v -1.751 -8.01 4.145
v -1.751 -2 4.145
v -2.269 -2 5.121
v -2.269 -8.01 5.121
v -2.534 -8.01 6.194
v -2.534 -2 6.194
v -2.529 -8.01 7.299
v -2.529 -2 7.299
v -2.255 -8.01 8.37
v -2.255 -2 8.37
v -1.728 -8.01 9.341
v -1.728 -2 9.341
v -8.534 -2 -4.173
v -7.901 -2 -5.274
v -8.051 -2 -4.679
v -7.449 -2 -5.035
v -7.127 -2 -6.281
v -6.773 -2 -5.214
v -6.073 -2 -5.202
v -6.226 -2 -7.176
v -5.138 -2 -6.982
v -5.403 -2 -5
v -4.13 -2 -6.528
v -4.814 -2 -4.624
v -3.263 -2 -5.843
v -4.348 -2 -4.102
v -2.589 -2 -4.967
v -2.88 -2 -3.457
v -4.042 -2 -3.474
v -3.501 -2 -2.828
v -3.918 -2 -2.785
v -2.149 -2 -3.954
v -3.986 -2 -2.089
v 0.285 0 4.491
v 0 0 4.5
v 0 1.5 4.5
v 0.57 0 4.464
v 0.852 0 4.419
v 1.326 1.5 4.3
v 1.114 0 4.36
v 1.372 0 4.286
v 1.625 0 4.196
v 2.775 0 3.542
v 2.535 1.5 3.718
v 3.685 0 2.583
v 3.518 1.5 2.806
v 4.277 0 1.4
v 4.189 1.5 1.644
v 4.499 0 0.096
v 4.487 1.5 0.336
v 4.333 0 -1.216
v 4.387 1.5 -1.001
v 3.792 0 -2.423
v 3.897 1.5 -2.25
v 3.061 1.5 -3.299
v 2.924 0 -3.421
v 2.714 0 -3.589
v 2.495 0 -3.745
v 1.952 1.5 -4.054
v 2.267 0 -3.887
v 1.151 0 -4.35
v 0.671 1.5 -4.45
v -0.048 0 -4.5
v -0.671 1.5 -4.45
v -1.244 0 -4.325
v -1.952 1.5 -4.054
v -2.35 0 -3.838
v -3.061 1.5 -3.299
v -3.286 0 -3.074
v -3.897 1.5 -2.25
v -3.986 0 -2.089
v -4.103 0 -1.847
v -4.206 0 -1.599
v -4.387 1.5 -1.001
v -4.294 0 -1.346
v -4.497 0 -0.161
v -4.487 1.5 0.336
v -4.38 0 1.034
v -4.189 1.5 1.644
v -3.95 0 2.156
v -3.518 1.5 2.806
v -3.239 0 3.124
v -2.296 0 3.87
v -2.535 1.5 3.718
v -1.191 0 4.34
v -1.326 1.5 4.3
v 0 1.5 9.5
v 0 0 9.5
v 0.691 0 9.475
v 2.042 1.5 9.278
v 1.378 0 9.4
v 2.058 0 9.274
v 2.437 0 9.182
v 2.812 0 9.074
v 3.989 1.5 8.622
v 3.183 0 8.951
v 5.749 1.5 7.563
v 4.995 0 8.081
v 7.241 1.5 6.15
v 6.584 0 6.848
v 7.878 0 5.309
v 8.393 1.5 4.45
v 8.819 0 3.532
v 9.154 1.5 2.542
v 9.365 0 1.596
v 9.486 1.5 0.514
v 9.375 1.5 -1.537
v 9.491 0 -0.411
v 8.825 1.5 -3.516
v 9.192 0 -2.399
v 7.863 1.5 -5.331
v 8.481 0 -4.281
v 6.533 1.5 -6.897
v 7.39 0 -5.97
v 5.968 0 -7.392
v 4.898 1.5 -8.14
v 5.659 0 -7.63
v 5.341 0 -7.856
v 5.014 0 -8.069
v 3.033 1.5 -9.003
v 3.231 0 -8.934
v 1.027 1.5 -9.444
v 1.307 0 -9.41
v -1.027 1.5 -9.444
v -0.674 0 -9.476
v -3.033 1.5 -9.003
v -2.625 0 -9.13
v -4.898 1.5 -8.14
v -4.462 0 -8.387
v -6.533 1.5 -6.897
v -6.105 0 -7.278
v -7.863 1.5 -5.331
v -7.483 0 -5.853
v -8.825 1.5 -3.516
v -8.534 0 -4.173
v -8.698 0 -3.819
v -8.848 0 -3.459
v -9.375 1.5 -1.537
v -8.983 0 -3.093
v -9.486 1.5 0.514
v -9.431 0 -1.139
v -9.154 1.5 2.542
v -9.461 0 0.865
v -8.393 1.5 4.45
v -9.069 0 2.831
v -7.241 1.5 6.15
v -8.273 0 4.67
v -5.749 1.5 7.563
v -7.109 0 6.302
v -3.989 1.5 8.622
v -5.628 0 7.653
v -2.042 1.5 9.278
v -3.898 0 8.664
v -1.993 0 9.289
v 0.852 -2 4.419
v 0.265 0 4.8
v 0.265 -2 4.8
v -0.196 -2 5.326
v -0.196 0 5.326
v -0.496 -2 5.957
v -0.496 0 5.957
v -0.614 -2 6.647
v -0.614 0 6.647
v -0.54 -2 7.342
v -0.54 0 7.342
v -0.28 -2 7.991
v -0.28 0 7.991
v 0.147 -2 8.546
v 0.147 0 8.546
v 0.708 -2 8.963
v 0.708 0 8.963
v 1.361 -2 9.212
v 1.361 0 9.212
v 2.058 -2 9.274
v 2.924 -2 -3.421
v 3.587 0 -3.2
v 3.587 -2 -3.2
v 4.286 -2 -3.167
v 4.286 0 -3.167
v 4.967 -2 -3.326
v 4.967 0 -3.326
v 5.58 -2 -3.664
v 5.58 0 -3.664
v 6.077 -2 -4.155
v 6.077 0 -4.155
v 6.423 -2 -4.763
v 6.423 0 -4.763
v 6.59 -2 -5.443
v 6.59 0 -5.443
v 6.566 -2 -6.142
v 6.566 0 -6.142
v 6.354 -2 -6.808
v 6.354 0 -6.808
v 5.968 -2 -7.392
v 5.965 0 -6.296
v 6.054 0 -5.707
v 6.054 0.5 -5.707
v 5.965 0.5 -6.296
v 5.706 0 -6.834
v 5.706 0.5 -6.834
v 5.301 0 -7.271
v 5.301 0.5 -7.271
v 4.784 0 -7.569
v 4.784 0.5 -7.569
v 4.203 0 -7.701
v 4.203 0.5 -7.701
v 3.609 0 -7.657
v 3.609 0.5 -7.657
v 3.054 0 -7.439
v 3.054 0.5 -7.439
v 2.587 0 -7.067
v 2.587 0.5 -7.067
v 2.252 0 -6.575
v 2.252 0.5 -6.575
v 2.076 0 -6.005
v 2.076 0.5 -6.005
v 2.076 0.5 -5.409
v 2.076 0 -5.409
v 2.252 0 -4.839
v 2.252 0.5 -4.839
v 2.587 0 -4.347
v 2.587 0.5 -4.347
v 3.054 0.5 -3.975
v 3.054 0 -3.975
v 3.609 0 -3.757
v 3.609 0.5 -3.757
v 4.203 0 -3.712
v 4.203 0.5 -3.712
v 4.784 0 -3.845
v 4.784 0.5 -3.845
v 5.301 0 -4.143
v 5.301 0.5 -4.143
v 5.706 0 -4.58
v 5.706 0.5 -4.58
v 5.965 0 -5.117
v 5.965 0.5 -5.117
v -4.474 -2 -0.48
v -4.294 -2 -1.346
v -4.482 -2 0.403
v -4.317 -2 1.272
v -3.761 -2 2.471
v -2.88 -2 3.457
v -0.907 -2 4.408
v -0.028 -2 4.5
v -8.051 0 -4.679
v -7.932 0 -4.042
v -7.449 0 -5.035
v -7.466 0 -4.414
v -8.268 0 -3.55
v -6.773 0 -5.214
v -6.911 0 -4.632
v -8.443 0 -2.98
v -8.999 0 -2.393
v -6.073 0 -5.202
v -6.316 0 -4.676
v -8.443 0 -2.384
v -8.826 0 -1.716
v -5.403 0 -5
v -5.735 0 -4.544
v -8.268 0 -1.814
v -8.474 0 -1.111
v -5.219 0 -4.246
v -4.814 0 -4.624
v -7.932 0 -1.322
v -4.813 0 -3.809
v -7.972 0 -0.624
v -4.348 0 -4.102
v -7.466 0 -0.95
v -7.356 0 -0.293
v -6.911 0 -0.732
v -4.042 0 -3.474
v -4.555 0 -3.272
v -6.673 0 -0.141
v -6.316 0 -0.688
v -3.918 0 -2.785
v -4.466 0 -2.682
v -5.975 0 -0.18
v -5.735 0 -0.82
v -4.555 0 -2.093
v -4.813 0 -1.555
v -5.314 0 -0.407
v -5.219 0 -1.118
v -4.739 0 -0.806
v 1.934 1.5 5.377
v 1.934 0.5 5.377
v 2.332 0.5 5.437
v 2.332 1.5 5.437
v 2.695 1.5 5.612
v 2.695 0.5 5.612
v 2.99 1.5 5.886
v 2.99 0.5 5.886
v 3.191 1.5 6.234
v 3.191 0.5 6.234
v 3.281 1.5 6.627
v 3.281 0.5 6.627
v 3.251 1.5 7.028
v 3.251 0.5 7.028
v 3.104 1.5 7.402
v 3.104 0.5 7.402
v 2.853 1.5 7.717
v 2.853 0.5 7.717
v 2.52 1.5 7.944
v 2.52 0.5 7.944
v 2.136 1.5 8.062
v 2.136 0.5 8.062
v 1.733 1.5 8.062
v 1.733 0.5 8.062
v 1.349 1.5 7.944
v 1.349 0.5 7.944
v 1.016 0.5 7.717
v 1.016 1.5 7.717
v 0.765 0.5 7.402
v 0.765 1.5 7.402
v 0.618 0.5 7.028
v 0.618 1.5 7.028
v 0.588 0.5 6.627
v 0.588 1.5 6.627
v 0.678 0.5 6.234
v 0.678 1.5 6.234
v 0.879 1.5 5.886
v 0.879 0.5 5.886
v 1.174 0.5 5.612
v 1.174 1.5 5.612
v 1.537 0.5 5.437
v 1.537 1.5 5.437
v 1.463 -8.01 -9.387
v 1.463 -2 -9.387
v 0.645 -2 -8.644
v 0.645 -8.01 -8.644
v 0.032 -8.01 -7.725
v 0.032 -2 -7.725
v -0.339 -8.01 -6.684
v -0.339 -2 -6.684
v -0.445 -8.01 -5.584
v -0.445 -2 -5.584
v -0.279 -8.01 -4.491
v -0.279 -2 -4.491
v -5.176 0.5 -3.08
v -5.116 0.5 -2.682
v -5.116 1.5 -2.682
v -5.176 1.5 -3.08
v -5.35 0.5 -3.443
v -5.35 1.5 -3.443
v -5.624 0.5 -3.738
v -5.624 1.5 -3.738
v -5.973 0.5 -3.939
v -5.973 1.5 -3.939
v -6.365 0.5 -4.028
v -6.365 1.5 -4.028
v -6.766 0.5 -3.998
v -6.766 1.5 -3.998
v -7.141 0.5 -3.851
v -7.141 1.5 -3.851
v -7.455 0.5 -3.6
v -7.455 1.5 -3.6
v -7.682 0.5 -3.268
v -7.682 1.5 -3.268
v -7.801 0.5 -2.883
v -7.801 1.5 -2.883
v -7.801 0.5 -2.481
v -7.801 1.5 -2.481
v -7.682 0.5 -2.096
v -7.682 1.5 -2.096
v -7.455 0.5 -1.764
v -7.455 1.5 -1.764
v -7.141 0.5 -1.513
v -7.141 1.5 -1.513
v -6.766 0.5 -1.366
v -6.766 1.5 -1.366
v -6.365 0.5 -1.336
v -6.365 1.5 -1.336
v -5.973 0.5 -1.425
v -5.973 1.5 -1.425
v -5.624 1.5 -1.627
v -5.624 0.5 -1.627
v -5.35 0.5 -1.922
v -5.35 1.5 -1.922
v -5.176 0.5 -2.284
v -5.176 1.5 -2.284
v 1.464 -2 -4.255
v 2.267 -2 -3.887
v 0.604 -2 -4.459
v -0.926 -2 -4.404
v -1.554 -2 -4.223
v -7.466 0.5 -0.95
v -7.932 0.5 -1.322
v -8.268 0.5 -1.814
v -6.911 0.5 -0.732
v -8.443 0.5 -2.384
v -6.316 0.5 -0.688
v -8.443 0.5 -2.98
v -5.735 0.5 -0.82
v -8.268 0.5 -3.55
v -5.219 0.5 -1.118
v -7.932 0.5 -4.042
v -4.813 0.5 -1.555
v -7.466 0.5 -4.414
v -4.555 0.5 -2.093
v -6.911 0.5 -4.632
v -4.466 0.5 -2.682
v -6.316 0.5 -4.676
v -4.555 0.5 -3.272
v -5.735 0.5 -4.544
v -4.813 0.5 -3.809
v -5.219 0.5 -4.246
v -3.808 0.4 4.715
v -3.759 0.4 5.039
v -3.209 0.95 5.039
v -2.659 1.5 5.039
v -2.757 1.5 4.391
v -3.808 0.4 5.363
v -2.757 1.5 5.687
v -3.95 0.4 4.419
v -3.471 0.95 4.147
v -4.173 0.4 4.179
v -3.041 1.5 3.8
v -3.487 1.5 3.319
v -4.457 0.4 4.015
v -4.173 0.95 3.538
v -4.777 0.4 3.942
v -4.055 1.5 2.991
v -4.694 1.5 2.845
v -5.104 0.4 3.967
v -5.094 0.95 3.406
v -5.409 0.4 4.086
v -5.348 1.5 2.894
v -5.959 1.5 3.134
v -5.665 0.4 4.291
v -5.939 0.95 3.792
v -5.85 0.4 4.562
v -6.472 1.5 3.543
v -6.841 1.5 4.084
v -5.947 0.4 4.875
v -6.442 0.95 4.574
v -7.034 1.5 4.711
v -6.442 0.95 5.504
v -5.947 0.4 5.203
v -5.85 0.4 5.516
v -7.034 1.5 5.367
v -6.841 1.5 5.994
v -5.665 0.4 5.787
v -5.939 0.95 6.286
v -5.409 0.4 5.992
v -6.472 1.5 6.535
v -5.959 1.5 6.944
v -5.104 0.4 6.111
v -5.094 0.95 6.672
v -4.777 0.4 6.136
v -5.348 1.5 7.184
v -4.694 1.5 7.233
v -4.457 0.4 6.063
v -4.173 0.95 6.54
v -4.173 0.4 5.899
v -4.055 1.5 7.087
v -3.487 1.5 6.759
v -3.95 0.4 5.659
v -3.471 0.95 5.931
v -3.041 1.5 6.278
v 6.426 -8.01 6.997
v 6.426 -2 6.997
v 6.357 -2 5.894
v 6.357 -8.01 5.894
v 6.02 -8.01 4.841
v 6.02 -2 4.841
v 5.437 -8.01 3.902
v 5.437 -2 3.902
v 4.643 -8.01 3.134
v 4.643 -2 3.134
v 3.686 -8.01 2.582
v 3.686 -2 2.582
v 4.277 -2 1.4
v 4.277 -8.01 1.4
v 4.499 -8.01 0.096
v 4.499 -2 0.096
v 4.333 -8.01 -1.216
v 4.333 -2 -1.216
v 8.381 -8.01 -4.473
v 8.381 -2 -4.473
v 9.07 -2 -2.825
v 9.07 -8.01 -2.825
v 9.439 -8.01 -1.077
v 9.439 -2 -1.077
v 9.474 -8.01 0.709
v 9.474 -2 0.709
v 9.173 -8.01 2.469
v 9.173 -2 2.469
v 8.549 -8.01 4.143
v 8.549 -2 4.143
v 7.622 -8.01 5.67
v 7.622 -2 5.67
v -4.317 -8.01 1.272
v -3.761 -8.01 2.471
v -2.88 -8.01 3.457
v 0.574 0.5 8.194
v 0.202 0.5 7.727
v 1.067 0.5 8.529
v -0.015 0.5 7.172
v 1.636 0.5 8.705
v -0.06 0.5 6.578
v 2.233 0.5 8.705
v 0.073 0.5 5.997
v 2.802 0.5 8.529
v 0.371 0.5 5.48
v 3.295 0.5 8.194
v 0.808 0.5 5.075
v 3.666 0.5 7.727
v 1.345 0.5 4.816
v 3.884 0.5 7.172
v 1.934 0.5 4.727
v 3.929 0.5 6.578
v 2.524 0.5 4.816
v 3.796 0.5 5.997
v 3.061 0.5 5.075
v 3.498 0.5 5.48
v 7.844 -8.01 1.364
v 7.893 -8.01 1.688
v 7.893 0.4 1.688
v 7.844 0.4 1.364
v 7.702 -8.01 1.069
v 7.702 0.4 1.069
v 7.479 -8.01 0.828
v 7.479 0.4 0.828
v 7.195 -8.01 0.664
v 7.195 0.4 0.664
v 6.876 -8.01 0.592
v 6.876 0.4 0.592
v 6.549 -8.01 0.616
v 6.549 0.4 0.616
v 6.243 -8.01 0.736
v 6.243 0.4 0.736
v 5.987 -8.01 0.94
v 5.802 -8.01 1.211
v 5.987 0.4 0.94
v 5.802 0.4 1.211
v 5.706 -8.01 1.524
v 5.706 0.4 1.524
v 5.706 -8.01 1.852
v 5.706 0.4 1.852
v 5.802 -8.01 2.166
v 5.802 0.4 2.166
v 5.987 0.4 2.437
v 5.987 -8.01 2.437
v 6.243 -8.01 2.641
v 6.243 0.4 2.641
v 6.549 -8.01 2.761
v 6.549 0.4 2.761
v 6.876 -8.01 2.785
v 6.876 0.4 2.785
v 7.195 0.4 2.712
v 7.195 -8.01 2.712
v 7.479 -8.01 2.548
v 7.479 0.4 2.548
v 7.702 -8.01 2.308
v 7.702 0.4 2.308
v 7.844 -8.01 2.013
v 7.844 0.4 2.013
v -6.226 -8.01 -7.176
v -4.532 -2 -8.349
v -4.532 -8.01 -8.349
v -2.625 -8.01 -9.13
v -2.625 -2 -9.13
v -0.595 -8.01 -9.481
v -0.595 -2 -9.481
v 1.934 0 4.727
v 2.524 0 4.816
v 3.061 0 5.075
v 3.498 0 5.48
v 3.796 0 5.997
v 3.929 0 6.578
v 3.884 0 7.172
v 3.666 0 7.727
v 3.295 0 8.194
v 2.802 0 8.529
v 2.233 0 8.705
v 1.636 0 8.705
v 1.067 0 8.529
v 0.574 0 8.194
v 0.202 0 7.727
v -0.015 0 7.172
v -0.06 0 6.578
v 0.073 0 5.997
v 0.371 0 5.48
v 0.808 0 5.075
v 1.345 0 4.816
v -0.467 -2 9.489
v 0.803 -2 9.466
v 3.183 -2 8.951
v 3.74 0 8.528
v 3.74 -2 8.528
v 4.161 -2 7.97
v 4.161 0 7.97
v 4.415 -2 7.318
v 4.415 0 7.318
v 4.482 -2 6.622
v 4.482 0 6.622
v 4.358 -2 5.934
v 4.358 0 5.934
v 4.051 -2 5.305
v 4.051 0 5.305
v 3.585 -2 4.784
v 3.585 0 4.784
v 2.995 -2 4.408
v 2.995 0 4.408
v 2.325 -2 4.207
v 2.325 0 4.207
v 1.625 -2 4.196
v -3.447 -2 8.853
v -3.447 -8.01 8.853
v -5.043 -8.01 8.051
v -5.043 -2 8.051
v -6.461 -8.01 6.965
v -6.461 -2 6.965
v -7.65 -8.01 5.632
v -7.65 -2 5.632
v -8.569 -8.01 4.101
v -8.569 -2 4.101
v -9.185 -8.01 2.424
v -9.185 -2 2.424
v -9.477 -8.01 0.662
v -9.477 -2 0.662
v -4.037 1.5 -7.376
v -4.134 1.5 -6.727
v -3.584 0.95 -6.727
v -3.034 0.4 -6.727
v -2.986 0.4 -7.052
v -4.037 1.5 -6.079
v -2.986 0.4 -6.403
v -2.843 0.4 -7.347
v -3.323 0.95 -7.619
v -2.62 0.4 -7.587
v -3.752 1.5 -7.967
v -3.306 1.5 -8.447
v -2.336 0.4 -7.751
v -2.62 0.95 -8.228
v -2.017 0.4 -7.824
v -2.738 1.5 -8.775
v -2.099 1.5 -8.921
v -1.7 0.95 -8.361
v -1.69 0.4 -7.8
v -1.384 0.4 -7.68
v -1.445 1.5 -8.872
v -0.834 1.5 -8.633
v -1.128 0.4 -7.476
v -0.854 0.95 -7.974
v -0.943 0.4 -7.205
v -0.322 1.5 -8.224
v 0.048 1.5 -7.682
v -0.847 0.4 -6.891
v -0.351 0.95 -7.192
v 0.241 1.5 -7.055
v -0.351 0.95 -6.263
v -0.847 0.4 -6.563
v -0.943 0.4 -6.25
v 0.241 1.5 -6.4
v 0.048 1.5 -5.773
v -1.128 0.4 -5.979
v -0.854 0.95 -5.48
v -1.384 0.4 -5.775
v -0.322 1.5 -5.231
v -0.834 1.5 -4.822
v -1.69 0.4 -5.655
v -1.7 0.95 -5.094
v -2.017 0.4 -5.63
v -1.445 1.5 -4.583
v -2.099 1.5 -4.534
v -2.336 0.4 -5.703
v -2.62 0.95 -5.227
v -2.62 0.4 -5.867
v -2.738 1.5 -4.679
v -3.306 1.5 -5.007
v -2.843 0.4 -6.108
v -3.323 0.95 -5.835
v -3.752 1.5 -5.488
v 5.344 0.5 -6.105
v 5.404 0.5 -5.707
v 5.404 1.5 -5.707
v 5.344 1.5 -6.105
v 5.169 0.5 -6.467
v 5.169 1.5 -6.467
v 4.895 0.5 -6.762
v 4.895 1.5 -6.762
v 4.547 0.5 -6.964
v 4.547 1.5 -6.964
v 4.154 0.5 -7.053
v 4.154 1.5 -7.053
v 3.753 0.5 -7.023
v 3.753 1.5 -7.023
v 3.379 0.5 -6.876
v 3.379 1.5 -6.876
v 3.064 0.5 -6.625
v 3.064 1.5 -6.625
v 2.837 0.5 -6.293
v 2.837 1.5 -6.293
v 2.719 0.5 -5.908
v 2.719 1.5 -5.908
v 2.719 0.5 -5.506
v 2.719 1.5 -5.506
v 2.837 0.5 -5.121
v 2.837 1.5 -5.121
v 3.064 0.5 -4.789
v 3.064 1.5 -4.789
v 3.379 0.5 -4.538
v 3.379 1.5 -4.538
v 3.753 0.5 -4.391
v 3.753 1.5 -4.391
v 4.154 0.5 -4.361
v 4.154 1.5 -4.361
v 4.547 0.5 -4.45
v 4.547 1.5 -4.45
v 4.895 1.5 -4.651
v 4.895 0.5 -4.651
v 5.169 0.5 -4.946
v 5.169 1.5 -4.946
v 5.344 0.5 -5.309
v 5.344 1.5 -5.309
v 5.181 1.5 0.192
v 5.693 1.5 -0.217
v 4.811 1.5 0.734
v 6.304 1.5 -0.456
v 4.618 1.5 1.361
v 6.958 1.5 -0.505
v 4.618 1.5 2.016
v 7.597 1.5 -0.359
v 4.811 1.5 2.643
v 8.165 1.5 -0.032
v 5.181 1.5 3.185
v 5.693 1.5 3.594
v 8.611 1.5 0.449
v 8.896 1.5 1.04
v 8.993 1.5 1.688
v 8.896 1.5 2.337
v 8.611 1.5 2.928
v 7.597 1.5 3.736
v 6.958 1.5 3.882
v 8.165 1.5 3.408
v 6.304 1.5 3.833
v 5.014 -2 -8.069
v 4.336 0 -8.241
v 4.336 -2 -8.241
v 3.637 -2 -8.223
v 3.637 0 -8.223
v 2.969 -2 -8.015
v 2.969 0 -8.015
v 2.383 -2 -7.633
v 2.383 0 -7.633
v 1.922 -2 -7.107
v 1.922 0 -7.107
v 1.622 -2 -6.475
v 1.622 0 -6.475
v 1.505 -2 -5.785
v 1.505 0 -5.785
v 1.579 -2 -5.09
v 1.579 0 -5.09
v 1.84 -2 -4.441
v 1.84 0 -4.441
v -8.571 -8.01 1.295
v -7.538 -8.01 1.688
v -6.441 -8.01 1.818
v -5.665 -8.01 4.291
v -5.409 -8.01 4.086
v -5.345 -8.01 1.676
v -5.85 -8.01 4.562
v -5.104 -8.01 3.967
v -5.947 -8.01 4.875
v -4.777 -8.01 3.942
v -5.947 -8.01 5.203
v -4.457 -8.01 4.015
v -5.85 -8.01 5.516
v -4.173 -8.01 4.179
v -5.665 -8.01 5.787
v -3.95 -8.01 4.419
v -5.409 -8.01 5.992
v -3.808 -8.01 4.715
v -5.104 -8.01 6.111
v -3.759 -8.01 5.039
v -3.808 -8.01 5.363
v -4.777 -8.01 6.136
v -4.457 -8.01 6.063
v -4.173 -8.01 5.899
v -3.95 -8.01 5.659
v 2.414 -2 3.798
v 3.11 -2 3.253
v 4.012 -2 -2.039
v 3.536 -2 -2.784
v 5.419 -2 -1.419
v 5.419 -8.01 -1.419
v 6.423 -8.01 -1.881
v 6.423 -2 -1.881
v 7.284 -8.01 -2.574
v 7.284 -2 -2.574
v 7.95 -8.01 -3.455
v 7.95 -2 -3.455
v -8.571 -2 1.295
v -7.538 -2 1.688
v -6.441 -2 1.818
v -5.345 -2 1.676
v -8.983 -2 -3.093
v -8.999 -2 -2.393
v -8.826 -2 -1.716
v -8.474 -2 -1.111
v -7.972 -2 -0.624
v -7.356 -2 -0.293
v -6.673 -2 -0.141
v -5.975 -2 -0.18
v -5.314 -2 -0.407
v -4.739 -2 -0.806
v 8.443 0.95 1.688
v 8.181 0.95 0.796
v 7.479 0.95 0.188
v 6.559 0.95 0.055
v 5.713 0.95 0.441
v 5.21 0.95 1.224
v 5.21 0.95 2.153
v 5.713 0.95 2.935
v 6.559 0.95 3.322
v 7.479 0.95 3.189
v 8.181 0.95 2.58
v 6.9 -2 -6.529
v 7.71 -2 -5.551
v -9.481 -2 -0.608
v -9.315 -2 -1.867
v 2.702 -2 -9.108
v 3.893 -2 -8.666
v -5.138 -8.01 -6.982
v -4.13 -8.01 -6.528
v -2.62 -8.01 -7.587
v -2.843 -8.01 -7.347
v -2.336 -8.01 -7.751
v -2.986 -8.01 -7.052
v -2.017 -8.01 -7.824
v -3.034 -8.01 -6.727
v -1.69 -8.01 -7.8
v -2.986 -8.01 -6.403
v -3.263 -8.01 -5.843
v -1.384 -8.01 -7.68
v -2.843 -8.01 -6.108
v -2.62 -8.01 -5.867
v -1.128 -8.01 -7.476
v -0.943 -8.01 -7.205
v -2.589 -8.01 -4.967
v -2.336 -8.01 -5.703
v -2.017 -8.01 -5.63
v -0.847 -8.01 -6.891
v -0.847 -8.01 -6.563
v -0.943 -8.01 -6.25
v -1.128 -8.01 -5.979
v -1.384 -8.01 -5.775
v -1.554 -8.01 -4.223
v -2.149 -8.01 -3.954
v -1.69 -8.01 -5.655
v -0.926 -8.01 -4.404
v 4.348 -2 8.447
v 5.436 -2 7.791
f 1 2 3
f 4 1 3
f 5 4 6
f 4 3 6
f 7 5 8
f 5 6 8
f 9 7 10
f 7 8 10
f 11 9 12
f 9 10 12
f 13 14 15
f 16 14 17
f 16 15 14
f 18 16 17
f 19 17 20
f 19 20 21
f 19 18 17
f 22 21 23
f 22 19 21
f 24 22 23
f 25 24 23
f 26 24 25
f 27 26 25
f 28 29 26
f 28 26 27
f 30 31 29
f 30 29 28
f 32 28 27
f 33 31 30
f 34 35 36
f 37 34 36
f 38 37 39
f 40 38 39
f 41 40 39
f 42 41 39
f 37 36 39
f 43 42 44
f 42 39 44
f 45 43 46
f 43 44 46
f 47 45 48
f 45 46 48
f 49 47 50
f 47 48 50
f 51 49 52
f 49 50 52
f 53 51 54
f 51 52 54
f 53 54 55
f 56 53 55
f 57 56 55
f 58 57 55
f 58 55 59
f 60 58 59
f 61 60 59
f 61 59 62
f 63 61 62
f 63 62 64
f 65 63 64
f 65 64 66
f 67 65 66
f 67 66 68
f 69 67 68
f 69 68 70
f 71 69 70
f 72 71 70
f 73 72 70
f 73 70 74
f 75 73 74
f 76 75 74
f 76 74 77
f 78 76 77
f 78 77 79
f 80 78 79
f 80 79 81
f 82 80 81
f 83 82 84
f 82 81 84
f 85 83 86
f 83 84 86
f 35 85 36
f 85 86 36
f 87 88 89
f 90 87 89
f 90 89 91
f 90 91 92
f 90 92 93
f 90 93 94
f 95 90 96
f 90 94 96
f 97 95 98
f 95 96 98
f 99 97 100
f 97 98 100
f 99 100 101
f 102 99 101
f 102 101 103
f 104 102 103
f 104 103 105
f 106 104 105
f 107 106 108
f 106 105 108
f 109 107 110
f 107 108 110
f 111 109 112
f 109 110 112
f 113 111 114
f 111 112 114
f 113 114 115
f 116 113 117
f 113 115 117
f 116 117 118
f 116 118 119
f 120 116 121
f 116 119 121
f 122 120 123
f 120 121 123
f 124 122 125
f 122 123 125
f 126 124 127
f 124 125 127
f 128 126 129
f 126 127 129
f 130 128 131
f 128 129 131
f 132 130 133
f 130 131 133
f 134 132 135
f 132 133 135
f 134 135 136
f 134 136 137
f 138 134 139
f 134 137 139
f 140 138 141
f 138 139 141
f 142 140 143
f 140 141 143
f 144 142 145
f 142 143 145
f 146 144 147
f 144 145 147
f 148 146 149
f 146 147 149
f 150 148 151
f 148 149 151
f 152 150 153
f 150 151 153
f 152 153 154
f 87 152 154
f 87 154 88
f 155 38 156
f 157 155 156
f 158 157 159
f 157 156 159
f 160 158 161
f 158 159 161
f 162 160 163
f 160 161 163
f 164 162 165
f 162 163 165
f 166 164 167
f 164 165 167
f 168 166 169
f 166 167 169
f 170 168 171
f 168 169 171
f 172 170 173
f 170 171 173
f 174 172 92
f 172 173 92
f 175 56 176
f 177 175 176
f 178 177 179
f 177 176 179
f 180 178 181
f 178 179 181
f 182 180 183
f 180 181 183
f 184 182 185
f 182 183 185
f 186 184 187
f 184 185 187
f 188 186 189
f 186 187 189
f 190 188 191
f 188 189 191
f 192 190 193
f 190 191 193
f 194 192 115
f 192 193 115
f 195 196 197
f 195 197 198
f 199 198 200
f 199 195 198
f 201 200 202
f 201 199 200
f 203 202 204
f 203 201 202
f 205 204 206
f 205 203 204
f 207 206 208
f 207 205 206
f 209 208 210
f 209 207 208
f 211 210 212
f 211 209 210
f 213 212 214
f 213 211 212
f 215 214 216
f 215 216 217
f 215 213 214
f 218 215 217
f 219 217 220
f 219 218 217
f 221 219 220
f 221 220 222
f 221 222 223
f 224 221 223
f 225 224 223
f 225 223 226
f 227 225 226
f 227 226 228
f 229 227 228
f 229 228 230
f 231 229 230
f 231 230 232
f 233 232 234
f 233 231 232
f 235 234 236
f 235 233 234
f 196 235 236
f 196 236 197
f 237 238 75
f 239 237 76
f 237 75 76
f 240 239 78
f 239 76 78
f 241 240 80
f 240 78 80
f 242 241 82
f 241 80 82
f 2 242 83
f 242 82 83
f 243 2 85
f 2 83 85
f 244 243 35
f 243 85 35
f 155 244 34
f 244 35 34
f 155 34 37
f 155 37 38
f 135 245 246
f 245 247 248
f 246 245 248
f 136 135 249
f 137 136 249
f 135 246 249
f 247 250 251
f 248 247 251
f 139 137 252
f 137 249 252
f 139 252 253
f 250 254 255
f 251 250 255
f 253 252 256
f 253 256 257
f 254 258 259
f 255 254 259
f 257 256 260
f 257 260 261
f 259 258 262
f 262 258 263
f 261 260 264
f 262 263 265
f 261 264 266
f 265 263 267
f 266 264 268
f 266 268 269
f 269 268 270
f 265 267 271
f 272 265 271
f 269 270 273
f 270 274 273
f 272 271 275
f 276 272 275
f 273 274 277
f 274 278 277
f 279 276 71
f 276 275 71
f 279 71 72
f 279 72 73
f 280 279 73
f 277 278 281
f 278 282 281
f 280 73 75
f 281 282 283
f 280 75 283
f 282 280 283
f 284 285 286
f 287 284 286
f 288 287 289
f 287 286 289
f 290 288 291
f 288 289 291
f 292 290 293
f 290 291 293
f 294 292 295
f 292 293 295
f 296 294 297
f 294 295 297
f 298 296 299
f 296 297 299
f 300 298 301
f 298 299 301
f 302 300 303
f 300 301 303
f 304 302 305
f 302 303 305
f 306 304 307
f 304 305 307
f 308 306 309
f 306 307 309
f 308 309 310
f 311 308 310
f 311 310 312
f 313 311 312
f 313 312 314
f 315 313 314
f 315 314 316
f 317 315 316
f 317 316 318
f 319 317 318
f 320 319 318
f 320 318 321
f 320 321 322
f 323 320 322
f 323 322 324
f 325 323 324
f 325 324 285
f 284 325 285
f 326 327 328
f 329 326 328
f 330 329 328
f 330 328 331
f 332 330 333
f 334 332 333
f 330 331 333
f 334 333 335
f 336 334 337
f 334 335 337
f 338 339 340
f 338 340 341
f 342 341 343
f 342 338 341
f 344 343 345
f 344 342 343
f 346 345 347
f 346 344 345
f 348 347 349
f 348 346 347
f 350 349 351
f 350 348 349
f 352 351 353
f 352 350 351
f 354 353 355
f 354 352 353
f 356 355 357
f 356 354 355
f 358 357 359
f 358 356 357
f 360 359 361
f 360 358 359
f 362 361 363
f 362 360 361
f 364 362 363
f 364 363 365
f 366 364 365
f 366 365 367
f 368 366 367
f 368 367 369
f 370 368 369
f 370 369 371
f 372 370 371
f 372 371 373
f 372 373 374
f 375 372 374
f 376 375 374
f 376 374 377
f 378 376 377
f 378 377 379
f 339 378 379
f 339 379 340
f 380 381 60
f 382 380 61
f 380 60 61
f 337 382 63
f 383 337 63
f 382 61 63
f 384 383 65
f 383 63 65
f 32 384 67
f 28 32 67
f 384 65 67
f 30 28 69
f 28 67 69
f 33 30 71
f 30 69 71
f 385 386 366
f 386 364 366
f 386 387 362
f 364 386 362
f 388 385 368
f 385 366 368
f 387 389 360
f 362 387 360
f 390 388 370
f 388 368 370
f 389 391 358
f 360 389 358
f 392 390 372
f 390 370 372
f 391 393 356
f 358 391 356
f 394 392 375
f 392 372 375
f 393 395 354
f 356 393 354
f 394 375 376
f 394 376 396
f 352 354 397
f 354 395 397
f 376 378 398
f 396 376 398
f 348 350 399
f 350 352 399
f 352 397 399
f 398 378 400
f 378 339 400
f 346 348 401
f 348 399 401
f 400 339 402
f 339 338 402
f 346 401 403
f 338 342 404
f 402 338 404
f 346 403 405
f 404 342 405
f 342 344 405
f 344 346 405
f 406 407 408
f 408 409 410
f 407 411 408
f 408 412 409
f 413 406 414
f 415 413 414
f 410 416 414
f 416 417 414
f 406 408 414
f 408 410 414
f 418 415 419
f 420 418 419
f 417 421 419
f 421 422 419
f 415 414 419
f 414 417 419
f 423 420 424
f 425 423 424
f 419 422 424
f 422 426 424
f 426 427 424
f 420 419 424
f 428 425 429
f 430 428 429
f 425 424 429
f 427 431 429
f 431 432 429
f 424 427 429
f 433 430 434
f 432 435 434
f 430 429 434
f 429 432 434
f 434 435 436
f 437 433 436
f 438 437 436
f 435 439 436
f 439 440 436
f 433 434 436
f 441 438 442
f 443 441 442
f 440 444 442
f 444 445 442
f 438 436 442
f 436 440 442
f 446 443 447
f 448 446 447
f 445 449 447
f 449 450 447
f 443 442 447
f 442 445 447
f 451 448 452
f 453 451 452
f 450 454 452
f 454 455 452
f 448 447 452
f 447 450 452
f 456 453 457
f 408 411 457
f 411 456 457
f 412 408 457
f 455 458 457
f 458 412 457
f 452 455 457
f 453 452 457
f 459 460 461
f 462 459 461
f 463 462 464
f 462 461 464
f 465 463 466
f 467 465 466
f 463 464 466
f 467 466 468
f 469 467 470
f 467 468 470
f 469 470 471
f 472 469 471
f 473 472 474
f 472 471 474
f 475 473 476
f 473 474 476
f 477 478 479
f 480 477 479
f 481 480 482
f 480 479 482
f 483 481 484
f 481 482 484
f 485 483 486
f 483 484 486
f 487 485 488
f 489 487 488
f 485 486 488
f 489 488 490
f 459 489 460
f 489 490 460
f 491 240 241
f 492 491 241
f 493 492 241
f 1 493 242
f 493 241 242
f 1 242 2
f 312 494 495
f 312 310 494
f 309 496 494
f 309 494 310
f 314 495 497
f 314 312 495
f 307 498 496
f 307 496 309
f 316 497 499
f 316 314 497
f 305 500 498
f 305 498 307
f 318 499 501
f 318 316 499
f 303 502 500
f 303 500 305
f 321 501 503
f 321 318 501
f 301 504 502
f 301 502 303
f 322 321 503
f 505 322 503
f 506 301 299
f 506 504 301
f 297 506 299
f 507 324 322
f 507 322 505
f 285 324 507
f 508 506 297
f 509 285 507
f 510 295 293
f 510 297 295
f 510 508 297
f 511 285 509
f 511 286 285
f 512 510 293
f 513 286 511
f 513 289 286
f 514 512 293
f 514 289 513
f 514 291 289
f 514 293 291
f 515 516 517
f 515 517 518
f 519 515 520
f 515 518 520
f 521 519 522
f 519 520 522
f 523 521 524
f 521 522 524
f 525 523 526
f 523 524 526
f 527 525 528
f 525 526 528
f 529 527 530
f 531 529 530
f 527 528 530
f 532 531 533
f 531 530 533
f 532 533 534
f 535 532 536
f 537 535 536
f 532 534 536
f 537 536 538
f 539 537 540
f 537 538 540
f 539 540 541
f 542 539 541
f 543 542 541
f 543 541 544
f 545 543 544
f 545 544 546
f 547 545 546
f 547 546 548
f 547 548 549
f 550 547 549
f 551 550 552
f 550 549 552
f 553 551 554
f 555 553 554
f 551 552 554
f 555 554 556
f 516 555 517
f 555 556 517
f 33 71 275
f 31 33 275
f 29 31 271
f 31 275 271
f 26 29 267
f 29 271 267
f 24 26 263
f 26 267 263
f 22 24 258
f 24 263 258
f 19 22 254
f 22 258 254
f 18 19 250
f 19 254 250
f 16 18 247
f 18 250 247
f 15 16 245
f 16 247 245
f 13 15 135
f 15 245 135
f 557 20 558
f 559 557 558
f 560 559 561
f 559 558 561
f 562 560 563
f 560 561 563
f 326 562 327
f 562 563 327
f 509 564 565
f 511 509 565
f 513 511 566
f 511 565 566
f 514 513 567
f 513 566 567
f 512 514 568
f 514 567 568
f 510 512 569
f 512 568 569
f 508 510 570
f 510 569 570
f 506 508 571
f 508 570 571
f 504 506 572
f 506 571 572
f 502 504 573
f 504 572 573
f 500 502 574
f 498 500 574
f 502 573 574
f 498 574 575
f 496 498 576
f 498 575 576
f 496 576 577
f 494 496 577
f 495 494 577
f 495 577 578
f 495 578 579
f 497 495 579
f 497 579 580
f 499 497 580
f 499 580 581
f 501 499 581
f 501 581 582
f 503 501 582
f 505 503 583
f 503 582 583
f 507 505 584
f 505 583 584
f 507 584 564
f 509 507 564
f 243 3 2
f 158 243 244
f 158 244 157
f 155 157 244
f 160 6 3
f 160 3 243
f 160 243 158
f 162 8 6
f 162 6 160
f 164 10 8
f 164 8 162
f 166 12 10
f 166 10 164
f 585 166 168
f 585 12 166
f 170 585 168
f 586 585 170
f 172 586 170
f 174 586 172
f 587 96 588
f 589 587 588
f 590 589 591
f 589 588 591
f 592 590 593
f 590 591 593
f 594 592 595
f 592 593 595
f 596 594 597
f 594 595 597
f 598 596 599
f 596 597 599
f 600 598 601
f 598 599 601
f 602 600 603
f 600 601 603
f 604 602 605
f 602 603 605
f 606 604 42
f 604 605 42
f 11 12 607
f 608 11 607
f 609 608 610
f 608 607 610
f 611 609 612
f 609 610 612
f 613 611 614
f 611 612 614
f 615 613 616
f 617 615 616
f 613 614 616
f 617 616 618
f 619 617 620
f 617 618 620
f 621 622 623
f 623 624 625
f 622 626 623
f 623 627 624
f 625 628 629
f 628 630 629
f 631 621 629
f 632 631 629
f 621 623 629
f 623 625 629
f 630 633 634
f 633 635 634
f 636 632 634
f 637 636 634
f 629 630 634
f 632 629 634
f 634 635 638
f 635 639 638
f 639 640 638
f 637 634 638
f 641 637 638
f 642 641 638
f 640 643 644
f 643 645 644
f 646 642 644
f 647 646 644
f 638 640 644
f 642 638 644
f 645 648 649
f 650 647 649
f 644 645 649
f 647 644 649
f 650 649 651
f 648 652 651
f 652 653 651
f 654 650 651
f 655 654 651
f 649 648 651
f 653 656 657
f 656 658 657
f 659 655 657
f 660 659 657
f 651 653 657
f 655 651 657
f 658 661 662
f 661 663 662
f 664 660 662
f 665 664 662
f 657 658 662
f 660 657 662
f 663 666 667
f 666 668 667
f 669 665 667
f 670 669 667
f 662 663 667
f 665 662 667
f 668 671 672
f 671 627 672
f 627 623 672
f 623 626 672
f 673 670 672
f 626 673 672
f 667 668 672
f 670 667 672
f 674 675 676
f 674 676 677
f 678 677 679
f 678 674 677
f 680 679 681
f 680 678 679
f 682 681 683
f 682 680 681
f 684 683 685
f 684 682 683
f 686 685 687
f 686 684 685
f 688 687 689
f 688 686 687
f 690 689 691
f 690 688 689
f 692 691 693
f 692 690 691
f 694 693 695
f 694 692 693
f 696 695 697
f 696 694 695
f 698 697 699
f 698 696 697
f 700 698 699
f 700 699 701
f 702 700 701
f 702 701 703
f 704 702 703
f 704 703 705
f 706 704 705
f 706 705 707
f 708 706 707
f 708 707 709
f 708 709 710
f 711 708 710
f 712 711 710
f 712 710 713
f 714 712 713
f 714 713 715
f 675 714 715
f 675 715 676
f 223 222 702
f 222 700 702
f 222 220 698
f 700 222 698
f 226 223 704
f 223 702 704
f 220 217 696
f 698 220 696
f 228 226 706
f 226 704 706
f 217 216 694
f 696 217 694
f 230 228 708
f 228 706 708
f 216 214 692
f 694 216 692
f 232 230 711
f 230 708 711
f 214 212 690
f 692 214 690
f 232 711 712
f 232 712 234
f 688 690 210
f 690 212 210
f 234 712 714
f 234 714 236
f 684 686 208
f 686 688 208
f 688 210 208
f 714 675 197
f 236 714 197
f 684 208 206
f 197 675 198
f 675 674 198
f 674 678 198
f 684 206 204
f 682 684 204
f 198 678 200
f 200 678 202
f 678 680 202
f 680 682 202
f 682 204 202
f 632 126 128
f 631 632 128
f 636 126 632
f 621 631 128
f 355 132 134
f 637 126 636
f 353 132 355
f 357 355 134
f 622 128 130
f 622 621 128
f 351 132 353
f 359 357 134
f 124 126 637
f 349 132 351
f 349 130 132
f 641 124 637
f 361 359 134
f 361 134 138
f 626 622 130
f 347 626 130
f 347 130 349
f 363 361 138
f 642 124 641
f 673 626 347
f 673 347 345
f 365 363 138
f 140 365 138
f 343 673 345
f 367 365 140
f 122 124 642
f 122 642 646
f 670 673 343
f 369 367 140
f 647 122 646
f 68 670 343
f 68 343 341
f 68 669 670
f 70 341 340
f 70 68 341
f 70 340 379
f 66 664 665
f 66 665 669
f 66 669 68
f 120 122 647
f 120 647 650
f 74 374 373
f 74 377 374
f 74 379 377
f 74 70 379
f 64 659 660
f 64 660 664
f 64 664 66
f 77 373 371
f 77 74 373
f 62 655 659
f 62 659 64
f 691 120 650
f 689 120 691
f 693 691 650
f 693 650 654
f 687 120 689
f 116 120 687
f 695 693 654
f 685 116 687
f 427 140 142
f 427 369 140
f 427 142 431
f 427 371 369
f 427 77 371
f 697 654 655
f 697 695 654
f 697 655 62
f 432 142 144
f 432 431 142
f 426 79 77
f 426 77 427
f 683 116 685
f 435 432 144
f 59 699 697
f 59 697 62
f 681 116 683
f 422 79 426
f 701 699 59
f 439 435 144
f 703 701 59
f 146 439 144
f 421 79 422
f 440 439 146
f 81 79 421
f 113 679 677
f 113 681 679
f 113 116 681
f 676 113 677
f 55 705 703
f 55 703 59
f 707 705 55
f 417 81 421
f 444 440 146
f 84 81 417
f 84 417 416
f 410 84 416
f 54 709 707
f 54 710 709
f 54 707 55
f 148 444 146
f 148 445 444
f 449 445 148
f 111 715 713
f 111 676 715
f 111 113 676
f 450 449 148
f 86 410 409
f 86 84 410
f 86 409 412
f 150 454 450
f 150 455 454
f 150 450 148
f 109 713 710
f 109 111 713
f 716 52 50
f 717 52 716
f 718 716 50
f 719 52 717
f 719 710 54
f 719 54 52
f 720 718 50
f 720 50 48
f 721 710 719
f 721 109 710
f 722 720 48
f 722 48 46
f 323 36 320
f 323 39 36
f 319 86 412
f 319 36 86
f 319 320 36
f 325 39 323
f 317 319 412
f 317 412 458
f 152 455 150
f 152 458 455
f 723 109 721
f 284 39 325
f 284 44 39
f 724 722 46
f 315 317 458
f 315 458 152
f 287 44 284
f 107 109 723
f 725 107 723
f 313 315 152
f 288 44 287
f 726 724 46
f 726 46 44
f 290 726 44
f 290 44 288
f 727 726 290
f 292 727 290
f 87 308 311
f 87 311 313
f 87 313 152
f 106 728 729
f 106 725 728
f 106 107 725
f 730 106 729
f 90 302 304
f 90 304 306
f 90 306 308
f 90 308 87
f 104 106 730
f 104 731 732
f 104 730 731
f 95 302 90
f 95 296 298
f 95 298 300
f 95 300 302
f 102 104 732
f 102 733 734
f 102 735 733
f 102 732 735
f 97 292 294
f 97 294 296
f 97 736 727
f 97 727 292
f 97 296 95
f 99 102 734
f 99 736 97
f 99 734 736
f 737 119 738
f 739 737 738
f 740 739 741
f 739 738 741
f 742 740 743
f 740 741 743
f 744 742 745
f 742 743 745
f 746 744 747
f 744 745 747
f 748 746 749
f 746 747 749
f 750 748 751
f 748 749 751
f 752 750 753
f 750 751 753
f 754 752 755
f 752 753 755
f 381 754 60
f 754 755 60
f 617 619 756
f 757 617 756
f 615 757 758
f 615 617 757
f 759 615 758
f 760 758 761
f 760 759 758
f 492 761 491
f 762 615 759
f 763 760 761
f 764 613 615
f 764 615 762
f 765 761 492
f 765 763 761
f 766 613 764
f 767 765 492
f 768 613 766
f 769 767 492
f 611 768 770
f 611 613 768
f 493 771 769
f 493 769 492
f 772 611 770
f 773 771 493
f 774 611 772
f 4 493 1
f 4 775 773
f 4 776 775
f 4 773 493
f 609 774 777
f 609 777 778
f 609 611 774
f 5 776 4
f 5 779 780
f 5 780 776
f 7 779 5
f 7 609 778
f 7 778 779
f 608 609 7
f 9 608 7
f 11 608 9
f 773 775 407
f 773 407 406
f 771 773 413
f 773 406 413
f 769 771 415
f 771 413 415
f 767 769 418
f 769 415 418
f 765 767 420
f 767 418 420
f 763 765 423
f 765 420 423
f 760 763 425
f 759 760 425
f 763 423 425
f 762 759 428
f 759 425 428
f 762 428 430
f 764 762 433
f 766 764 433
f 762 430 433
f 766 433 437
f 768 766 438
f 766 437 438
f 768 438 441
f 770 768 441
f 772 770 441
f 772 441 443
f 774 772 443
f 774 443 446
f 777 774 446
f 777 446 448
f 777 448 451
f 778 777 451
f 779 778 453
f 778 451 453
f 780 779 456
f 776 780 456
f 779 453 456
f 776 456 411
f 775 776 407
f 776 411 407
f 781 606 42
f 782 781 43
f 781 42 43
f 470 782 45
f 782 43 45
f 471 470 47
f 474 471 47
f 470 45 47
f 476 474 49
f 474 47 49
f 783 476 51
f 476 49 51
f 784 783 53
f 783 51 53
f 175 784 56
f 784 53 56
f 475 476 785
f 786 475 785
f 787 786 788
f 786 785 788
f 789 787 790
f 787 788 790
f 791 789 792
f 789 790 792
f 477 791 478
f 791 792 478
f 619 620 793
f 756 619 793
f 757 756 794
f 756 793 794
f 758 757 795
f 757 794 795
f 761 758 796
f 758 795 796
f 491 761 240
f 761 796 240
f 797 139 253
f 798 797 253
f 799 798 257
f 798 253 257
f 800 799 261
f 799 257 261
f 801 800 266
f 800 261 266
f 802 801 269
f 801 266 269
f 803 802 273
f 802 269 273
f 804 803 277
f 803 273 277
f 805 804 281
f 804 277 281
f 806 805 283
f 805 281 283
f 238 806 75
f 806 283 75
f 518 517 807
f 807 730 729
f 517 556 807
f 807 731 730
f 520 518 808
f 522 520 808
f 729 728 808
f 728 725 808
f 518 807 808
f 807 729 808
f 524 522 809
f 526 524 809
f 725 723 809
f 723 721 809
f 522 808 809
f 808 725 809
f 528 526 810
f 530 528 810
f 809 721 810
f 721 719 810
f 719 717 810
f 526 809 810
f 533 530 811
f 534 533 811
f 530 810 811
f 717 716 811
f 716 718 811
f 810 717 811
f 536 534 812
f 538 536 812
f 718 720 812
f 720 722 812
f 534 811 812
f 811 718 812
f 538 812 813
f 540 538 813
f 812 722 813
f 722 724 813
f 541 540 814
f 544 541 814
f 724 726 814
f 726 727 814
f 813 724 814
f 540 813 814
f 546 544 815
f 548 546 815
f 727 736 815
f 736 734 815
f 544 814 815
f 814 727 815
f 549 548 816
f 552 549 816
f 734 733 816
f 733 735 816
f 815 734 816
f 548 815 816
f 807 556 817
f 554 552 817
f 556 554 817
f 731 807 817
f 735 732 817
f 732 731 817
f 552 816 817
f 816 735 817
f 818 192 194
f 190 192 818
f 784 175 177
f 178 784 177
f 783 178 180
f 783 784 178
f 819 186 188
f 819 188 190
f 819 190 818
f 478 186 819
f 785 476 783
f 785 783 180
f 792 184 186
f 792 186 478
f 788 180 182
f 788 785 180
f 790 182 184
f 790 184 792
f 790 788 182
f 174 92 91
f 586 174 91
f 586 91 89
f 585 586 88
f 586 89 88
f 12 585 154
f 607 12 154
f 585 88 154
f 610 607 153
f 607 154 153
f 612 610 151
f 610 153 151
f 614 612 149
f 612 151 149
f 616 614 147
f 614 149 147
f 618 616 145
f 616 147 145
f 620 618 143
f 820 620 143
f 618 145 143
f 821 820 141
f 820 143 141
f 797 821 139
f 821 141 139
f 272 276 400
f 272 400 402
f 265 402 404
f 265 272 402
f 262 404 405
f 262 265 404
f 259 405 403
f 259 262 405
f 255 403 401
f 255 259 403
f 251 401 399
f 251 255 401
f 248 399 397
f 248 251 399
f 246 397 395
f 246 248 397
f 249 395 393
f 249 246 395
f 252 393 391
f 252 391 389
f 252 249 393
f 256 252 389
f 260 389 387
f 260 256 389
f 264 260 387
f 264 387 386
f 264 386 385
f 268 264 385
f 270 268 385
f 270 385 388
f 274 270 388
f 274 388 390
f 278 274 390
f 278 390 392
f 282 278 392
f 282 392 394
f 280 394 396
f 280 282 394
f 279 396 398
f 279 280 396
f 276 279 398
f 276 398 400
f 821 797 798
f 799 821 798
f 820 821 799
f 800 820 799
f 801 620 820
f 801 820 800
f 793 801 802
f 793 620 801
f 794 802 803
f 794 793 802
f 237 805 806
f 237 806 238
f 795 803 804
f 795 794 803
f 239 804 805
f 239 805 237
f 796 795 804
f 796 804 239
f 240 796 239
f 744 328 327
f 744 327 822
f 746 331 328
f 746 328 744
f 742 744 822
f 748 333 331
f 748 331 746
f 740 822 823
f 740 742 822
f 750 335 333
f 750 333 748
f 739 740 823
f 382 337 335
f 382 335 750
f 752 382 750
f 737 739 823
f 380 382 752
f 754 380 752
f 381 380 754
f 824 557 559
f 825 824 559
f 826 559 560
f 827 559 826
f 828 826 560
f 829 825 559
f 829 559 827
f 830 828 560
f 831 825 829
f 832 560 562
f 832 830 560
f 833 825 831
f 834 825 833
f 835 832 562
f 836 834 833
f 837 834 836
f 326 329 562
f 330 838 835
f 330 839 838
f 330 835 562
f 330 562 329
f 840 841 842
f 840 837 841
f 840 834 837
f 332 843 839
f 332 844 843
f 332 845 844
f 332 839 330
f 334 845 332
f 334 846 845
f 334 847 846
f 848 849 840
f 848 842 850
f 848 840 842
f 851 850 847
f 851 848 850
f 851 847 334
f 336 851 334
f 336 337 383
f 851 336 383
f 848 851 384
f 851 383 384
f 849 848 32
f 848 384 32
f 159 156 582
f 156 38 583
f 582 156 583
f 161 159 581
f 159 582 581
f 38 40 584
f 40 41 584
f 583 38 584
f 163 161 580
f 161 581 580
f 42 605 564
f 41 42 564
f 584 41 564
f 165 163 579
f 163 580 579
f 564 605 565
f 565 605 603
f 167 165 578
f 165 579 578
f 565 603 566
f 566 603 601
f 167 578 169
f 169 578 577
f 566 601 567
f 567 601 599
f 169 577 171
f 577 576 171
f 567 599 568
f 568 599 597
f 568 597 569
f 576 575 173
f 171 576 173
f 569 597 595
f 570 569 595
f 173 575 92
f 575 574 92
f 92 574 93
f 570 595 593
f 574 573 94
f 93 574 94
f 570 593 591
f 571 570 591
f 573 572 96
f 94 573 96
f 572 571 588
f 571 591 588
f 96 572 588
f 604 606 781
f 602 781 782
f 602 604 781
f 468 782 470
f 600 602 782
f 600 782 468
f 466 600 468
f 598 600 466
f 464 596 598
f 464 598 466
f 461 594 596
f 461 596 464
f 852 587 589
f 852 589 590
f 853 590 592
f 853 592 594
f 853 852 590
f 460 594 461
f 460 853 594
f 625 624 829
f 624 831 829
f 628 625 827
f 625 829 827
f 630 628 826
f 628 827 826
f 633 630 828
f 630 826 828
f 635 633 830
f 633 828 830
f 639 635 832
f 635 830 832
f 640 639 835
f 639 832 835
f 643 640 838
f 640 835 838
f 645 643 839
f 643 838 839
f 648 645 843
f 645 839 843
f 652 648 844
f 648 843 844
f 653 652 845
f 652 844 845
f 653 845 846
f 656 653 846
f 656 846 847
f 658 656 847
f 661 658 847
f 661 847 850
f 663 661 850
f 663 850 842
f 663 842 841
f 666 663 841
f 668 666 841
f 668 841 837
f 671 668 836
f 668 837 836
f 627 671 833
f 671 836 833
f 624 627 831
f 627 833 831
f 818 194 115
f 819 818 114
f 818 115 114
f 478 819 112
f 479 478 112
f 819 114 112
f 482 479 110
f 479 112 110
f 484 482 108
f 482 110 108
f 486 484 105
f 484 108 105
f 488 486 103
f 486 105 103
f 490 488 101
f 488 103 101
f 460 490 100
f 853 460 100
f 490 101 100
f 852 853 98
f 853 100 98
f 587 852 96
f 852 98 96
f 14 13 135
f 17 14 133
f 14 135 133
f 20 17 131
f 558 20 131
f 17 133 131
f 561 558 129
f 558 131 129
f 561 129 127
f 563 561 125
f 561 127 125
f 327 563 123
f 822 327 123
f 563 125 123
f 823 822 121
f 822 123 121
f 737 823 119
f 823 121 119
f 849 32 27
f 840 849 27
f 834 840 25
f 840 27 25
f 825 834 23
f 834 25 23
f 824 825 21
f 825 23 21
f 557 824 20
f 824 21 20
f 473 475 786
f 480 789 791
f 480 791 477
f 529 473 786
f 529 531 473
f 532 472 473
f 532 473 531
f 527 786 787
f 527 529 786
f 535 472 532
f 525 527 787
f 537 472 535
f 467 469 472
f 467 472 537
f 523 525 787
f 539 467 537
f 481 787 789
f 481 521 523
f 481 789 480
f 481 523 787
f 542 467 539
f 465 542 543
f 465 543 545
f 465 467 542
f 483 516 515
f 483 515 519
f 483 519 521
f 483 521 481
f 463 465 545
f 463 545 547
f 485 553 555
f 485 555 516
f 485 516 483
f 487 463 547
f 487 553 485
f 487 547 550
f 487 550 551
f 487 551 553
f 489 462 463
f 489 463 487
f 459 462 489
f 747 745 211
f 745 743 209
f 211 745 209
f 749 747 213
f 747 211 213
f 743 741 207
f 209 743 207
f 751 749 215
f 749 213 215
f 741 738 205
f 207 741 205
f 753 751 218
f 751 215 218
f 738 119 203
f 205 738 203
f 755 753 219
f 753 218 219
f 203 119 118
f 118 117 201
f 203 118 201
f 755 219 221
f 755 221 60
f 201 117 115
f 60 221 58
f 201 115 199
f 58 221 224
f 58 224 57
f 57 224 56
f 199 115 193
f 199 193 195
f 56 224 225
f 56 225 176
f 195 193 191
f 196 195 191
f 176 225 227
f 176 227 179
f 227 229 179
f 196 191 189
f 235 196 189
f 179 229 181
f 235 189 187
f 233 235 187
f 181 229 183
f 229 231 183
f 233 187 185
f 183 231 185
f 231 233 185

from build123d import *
from build123d.topology import SkipClean

# Parameters (mm, degrees)
SKETCH1_R                                       = 9.5
BOSS_EXTRUDE1_DEPTH                             = 1.5
SKETCH2_R                                       = 4.5
CUT_EXTRUDE1_DEPTH                              = 14.518505835
SKETCH3_R                                       = 2
CUT_EXTRUDE5_DEPTH                              = 0.5
SKETCH4_R                                       = 1.35
CUT_EXTRUDE6_DEPTH                              = 14.518505835
BOSS_EXTRUDE2_DEPTH                             = 2
CIRPATTERN1_OUTLINE_R                           = 1.35
CIRPATTERN1_DEPTH                               = 1.5
CIRPATTERN1_2_OUTLINE_R                         = 2
CIRPATTERN1_2_OUTLINE_R_2                       = 1.35
CIRPATTERN1_2_DEPTH                             = 0.5
BOSS_EXTRUDE3_DEPTH                             = 6.01
CSK_FOR_M2_FLAT_HEAD_MACHINE_SCREW1_D           = 2.2
CSK_FOR_M2_FLAT_HEAD_MACHINE_SCREW1_CSINK_D     = 4.4
CSK_FOR_M2_FLAT_HEAD_MACHINE_SCREW1_CSINK_ANGLE = 90


# Read off the part's stored shape, not the designer's step: CirPattern1, CirPattern2
with BuildPart() as part:
    # Sketch1 → Boss-Extrude1 (new body)
    with BuildSketch(Plane(origin=(0, 0, 0), x_dir=(1, 0, 0), z_dir=(0, 1, 0))):
        with Locations(Location((0, 0, 0), (0, 0, 270))):
            Circle(SKETCH1_R)
    extrude(amount=BOSS_EXTRUDE1_DEPTH)

    # Sketch2 → Cut-Extrude1 (cut, through all)
    with BuildSketch(Plane(origin=(0, 1.5, 0), x_dir=(1, 0, 0), z_dir=(0, 1, 0))):
        with Locations(Location((0, 0, 0), (0, 0, 270))):
            Circle(SKETCH2_R)
    extrude(amount=-CUT_EXTRUDE1_DEPTH, mode=Mode.SUBTRACT)

    # Sketch3 → Cut-Extrude5 (cut)
    with BuildSketch(Plane.XZ):
        with Locations(Location((1.93443789, 6.72740292, 0), (0, 0, 270))):
            Circle(SKETCH3_R)
    extrude(amount=-CUT_EXTRUDE5_DEPTH, mode=Mode.SUBTRACT)

    # Sketch4 → Cut-Extrude6 (cut, through all)
    with BuildSketch(Plane.XZ):
        with Locations(Location((1.93443789, 6.72740292, 0), (0, 0, 270))):
            Circle(SKETCH4_R)
    extrude(amount=-CUT_EXTRUDE6_DEPTH, mode=Mode.SUBTRACT)

    # Sketch5 → Boss-Extrude2 (add)
    with SkipClean():  # the faces are left unmerged after this step: merging them gives an invalid solid
        with BuildSketch(Plane.XZ):
            with BuildLine():
                ThreePointArc((3.182648464, 8.951019425), (4.357780459, 5.933733723), (1.625396676, 4.196198952))
                ThreePointArc((1.625396676, 4.196198952), (4.436036831, 0.756027269), (2.92357195, -3.420924883))
                ThreePointArc((2.92357195, -3.420924883), (6.077241126, -4.155308257), (5.967881507, -7.391507987))
                ThreePointArc((5.967881507, -7.391507987), (9.364966644, 1.596057567), (3.182648464, 8.951019425))
            make_face()
            with BuildLine():
                ThreePointArc((0.851769477, 4.418652369), (-0.540347051, 7.342170761), (2.058000389, 9.274407496))
                ThreePointArc((2.058000389, 9.274407496), (-7.086809251, 6.326700138), (-8.982537647, -3.092574561))
                ThreePointArc((-8.982537647, -3.092574561), (-7.356211508, -0.292572507), (-4.294138699, -1.34550096))
                ThreePointArc((-4.294138699, -1.34550096), (-3.356909645, 2.99685796), (0.851769477, 4.418652369))
            make_face()
            with BuildLine():
                ThreePointArc((-8.534166016, -4.173488997), (-2.625308565, -9.13004682), (5.013839927, -8.069164095))
                ThreePointArc((5.013839927, -8.069164095), (1.922148158, -7.106672419), (2.267302196, -3.887073546))
                ThreePointArc((2.267302196, -3.887073546), (-1.243567215, -4.32475902), (-3.985711115, -2.089044497))
                ThreePointArc((-3.985711115, -2.089044497), (-5.403439375, -5.000228929), (-8.534166016, -4.173488997))
            make_face()
        extrude(amount=BOSS_EXTRUDE2_DEPTH)

    # CirPattern1 outline → CirPattern1 (cut)
    with SkipClean():  # the faces are left unmerged after this step: merging them gives an invalid solid
        with BuildSketch(Plane(origin=(0, 0, 0), x_dir=(1, 0, 0), z_dir=(0, 1, 0))):
            with Locations((4.053593102, 5.706871557)):
                Circle(CIRPATTERN1_OUTLINE_R)
            with Locations((-6.465797695, 2.68206267)):
                Circle(CIRPATTERN1_OUTLINE_R)
        extrude(amount=CIRPATTERN1_DEPTH, mode=Mode.SUBTRACT)

    # CirPattern1 2 outline → CirPattern1 2 (cut)
    # profile 1 of 2: a face of its own
    with SkipClean():  # the faces are left unmerged after this step: merging them gives an invalid solid
        with BuildSketch(Plane(origin=(0, 0, 0), x_dir=(1, 0, 0), z_dir=(0, 1, 0))):
            with Locations((-6.465797695, 2.68206267)):
                Circle(CIRPATTERN1_2_OUTLINE_R)
            with Locations((-6.465797695, 2.68206267)):
                Circle(CIRPATTERN1_2_OUTLINE_R_2, mode=Mode.SUBTRACT)
        # profile 2 of 2: a face of its own
        with BuildSketch(Plane(origin=(0, 0, 0), x_dir=(1, 0, 0), z_dir=(0, 1, 0))):
            with Locations((4.053593102, 5.706871557)):
                Circle(CIRPATTERN1_2_OUTLINE_R)
            with Locations((4.053593102, 5.706871557)):
                Circle(CIRPATTERN1_2_OUTLINE_R_2, mode=Mode.SUBTRACT)
        extrude(amount=CIRPATTERN1_2_DEPTH, mode=Mode.SUBTRACT)

    # Sketch9 → Boss-Extrude3 (add)
    with SkipClean():  # the faces are left unmerged after this step: merging them gives an invalid solid
        with BuildSketch(Plane.XZ.offset(2)):
            with BuildLine():
                ThreePointArc((-9.476901231, 0.662074811), (-6.993614762, 1.786875586), (-4.31661582, 1.271545462))
                ThreePointArc((-4.31661582, 1.271545462), (-3.356909645, 2.99685796), (-1.751062326, 4.145332403))
                ThreePointArc((-1.751062326, 4.145332403), (-2.565519544, 6.746975713), (-1.728461612, 9.341435674))
                ThreePointArc((-1.728461612, 9.341435674), (-7.086809251, 6.326700138), (-9.476901231, 0.662074811))
            make_face()
            with BuildLine():
                ThreePointArc((6.426382202, 6.996542846), (5.757483071, 4.353729492), (3.685500216, 2.582070517))
                ThreePointArc((3.685500216, 2.582070517), (4.436036831, 0.756027269), (4.332720881, -1.215536824))
                ThreePointArc((4.332720881, -1.215536824), (6.874573296, -2.200866602), (8.38110669, -4.472924173))
                ThreePointArc((8.38110669, -4.472924173), (9.364966644, 1.596057567), (6.426382202, 6.996542846))
            make_face()
            with BuildLine():
                ThreePointArc((1.4633337, -9.386621036), (-0.185849196, -7.215887463), (-0.279127779, -4.491334733))
                ThreePointArc((-0.279127779, -4.491334733), (-1.243567215, -4.32475902), (-2.149181875, -3.953608133))
                ThreePointArc((-2.149181875, -3.953608133), (-3.675422752, -6.212474499), (-6.225750314, -7.175655582))
                ThreePointArc((-6.225750314, -7.175655582), (-2.625308565, -9.13004682), (1.4633337, -9.386621036))
            make_face()
        extrude(amount=BOSS_EXTRUDE3_DEPTH)

    # CSK for M2 Flat Head Machine Screw1 (through all)
    with Locations(Plane(origin=(0, 1.5, 0), x_dir=(1, 0, 0), z_dir=(0, 1, 0))):
        with Locations((-1.93443789, 6.72740292)):
            CounterSinkHole(CSK_FOR_M2_FLAT_HEAD_MACHINE_SCREW1_D / 2, CSK_FOR_M2_FLAT_HEAD_MACHINE_SCREW1_CSINK_D / 2, counter_sink_angle=CSK_FOR_M2_FLAT_HEAD_MACHINE_SCREW1_CSINK_ANGLE)

    # CirPattern2 outline → CirPattern2 (revolve, cut)
    with SkipClean():  # the faces are left unmerged after this step: merging them gives an invalid solid
        with BuildSketch(Plane(origin=(6.793320775, 0, 1.688429105), x_dir=(1, 0, 0), z_dir=(0, 0, 1))):
            Polygon((0, -8.01), (1.1, -8.01), (1.1, 0.4), (2.2, 1.5), (0, 1.5), align=None)
        revolve(axis=Axis((6.793320775, 0, 1.688429105), (0, 1, 0)), mode=Mode.SUBTRACT)

    # CirPattern2 2 outline → CirPattern2 2 (revolve, cut)
    with SkipClean():  # the faces are left unmerged after this step: merging them gives an invalid solid
        with BuildSketch(Plane(origin=(-4.858882885, 0, 5.038973815), x_dir=(1, 0, 0), z_dir=(0, 0, 1))):
            Polygon((0, -8.01), (1.1, -8.01), (1.1, 0.4), (2.2, 1.5), (0, 1.5), align=None)
        revolve(axis=Axis((-4.858882885, 0, 5.038973815), (0, 1, 0)), mode=Mode.SUBTRACT)


solid = part.part
